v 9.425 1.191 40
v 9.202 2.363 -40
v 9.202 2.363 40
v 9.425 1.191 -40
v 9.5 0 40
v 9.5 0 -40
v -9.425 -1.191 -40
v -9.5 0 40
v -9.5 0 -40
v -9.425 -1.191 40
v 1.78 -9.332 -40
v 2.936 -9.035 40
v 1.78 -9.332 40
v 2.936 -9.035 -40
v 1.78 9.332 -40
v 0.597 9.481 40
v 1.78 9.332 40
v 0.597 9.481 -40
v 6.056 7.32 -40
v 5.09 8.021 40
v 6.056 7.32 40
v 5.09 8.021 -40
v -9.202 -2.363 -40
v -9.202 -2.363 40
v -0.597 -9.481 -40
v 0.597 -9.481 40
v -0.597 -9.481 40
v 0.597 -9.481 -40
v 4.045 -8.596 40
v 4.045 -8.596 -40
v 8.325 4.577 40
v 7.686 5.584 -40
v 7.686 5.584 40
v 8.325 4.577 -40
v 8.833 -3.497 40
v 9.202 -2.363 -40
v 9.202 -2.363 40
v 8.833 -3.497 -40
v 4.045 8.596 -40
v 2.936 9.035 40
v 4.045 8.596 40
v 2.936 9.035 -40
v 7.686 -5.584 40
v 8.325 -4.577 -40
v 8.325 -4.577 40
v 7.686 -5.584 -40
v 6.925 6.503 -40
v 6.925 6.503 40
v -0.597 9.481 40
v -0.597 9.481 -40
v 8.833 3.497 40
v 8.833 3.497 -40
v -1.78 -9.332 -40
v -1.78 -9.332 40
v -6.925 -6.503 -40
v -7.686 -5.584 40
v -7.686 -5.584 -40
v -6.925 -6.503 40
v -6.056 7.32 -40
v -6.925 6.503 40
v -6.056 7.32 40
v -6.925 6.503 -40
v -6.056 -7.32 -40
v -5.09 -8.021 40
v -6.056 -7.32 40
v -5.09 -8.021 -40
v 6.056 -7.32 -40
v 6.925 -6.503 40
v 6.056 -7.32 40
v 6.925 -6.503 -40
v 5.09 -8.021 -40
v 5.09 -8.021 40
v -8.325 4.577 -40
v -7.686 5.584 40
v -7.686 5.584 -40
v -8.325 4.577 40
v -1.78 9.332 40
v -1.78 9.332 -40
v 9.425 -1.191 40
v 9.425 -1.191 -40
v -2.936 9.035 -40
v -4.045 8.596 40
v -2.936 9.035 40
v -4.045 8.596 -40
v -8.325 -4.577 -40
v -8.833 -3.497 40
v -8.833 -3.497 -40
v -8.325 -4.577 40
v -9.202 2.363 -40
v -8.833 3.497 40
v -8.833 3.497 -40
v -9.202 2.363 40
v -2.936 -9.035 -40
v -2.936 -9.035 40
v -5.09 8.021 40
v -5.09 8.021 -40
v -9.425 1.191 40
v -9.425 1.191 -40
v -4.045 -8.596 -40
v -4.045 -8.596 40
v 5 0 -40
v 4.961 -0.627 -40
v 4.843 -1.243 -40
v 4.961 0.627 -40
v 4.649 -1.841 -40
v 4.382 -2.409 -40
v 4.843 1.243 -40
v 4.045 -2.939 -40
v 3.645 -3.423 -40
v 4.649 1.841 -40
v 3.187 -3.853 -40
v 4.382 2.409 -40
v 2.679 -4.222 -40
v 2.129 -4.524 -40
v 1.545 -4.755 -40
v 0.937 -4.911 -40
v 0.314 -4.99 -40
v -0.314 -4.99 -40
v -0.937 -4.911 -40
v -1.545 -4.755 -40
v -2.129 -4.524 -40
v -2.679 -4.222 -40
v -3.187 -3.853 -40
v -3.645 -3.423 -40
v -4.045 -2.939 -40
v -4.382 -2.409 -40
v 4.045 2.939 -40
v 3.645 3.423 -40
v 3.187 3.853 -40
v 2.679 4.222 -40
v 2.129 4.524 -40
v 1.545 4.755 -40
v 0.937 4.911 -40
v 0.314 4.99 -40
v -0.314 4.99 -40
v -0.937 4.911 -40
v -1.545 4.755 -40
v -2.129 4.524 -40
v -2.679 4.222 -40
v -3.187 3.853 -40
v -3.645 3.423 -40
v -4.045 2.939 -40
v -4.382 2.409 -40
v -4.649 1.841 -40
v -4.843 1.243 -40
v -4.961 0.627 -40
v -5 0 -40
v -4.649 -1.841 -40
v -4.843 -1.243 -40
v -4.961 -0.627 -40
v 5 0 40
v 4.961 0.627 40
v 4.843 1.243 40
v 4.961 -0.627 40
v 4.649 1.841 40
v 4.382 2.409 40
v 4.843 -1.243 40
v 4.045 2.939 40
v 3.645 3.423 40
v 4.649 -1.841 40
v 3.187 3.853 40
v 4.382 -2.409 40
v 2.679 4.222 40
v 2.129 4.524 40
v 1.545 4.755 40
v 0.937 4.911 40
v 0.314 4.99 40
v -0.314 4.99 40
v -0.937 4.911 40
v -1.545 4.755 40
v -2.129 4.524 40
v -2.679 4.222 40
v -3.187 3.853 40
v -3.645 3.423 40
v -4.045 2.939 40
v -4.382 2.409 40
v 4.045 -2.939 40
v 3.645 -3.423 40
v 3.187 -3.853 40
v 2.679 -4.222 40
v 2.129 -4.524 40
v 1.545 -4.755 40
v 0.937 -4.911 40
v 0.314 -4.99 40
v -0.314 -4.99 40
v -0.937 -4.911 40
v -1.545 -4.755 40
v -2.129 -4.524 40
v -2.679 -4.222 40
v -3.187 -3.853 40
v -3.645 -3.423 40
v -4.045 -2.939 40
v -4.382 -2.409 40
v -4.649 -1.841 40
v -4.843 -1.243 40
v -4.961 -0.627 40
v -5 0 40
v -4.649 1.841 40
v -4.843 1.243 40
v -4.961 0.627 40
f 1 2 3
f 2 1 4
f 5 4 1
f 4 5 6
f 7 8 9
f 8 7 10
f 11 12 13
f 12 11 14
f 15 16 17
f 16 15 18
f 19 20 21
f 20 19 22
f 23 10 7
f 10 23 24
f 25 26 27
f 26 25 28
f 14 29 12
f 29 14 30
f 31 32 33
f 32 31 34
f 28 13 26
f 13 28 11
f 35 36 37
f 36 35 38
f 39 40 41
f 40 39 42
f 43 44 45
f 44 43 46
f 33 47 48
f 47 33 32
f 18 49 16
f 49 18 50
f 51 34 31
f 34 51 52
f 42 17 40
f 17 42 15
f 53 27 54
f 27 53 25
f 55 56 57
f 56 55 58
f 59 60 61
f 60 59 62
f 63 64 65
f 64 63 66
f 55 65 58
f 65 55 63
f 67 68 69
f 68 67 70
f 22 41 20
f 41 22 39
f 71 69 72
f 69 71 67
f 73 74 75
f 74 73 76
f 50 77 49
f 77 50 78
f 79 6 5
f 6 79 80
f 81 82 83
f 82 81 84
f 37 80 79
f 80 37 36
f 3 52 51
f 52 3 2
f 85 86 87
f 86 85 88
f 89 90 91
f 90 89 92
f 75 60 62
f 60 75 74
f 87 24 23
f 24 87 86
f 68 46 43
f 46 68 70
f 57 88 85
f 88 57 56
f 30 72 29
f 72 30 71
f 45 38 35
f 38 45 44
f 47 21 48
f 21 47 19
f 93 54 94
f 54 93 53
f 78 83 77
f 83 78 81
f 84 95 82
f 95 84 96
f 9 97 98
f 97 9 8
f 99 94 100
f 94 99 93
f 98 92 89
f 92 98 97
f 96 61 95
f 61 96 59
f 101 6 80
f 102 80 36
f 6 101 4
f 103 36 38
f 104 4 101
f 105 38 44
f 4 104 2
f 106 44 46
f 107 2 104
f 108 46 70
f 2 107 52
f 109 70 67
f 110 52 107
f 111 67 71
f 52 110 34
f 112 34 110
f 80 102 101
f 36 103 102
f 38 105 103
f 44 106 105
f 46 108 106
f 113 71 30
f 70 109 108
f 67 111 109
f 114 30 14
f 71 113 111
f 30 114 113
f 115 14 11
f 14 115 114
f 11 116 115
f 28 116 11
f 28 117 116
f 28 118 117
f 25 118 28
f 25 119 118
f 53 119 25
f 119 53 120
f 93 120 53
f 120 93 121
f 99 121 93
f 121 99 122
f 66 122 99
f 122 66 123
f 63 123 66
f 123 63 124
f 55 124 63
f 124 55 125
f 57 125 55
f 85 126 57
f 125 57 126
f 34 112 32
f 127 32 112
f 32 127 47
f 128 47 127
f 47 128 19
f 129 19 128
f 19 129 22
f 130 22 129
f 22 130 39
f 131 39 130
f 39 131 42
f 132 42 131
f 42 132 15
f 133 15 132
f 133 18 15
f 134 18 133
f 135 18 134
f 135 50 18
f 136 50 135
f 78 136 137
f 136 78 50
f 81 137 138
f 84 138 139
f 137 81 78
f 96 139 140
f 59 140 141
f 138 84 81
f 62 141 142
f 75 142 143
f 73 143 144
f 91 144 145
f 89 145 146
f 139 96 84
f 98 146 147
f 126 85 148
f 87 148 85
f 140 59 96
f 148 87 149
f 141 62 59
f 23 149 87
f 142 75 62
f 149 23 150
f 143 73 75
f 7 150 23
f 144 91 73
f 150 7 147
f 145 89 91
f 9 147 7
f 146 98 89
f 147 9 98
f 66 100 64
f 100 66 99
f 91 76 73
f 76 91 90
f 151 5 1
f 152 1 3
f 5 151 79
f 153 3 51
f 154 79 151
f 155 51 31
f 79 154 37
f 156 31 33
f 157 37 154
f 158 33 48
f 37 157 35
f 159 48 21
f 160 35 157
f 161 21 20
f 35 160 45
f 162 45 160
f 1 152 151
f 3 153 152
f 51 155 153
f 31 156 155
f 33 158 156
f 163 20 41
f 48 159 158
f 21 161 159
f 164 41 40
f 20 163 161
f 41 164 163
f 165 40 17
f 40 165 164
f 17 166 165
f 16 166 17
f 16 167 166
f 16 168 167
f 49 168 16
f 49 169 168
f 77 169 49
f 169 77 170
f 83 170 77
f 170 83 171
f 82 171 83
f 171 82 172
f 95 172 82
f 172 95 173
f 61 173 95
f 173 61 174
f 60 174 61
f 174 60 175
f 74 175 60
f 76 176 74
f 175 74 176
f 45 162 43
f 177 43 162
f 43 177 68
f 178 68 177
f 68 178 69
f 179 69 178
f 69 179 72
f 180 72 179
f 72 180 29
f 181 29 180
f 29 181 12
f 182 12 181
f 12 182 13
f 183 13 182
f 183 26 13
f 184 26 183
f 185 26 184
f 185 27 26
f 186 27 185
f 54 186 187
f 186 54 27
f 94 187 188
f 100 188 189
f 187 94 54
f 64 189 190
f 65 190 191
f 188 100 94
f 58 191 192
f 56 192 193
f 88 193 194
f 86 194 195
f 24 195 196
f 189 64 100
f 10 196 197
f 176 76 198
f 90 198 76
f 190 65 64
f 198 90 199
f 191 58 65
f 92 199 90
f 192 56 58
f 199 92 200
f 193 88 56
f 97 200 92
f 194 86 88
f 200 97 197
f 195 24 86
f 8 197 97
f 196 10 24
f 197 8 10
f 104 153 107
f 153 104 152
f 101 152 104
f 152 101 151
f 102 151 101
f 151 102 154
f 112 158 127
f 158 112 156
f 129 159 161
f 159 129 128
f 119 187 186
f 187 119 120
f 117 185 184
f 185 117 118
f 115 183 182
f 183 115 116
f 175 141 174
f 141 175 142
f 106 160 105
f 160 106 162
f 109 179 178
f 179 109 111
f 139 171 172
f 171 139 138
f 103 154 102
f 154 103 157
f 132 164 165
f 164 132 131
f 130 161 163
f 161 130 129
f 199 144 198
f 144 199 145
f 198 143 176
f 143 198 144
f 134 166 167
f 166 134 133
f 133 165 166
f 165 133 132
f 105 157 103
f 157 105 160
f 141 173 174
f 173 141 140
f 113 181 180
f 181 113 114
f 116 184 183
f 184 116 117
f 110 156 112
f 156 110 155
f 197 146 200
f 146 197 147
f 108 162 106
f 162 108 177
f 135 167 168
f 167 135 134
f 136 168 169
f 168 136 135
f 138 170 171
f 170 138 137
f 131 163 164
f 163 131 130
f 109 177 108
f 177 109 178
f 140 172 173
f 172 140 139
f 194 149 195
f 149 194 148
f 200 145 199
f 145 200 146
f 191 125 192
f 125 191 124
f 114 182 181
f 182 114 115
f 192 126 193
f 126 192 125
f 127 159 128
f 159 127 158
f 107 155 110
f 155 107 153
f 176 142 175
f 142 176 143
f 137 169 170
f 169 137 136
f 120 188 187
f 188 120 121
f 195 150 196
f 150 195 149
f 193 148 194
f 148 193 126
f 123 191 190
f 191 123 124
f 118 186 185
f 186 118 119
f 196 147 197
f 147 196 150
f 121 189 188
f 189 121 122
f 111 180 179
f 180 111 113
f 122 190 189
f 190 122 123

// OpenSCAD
$fn = 50;


difference() {
	union() {
		translate(v = [0, 0, -40.0000000000]) {
			cylinder(h = 80, r = 9.5000000000);
		}
	}
	union() {
		translate(v = [0, 0, -100.0000000000]) {
			cylinder(h = 200, r = 5.0000000000);
		}
	}
}
